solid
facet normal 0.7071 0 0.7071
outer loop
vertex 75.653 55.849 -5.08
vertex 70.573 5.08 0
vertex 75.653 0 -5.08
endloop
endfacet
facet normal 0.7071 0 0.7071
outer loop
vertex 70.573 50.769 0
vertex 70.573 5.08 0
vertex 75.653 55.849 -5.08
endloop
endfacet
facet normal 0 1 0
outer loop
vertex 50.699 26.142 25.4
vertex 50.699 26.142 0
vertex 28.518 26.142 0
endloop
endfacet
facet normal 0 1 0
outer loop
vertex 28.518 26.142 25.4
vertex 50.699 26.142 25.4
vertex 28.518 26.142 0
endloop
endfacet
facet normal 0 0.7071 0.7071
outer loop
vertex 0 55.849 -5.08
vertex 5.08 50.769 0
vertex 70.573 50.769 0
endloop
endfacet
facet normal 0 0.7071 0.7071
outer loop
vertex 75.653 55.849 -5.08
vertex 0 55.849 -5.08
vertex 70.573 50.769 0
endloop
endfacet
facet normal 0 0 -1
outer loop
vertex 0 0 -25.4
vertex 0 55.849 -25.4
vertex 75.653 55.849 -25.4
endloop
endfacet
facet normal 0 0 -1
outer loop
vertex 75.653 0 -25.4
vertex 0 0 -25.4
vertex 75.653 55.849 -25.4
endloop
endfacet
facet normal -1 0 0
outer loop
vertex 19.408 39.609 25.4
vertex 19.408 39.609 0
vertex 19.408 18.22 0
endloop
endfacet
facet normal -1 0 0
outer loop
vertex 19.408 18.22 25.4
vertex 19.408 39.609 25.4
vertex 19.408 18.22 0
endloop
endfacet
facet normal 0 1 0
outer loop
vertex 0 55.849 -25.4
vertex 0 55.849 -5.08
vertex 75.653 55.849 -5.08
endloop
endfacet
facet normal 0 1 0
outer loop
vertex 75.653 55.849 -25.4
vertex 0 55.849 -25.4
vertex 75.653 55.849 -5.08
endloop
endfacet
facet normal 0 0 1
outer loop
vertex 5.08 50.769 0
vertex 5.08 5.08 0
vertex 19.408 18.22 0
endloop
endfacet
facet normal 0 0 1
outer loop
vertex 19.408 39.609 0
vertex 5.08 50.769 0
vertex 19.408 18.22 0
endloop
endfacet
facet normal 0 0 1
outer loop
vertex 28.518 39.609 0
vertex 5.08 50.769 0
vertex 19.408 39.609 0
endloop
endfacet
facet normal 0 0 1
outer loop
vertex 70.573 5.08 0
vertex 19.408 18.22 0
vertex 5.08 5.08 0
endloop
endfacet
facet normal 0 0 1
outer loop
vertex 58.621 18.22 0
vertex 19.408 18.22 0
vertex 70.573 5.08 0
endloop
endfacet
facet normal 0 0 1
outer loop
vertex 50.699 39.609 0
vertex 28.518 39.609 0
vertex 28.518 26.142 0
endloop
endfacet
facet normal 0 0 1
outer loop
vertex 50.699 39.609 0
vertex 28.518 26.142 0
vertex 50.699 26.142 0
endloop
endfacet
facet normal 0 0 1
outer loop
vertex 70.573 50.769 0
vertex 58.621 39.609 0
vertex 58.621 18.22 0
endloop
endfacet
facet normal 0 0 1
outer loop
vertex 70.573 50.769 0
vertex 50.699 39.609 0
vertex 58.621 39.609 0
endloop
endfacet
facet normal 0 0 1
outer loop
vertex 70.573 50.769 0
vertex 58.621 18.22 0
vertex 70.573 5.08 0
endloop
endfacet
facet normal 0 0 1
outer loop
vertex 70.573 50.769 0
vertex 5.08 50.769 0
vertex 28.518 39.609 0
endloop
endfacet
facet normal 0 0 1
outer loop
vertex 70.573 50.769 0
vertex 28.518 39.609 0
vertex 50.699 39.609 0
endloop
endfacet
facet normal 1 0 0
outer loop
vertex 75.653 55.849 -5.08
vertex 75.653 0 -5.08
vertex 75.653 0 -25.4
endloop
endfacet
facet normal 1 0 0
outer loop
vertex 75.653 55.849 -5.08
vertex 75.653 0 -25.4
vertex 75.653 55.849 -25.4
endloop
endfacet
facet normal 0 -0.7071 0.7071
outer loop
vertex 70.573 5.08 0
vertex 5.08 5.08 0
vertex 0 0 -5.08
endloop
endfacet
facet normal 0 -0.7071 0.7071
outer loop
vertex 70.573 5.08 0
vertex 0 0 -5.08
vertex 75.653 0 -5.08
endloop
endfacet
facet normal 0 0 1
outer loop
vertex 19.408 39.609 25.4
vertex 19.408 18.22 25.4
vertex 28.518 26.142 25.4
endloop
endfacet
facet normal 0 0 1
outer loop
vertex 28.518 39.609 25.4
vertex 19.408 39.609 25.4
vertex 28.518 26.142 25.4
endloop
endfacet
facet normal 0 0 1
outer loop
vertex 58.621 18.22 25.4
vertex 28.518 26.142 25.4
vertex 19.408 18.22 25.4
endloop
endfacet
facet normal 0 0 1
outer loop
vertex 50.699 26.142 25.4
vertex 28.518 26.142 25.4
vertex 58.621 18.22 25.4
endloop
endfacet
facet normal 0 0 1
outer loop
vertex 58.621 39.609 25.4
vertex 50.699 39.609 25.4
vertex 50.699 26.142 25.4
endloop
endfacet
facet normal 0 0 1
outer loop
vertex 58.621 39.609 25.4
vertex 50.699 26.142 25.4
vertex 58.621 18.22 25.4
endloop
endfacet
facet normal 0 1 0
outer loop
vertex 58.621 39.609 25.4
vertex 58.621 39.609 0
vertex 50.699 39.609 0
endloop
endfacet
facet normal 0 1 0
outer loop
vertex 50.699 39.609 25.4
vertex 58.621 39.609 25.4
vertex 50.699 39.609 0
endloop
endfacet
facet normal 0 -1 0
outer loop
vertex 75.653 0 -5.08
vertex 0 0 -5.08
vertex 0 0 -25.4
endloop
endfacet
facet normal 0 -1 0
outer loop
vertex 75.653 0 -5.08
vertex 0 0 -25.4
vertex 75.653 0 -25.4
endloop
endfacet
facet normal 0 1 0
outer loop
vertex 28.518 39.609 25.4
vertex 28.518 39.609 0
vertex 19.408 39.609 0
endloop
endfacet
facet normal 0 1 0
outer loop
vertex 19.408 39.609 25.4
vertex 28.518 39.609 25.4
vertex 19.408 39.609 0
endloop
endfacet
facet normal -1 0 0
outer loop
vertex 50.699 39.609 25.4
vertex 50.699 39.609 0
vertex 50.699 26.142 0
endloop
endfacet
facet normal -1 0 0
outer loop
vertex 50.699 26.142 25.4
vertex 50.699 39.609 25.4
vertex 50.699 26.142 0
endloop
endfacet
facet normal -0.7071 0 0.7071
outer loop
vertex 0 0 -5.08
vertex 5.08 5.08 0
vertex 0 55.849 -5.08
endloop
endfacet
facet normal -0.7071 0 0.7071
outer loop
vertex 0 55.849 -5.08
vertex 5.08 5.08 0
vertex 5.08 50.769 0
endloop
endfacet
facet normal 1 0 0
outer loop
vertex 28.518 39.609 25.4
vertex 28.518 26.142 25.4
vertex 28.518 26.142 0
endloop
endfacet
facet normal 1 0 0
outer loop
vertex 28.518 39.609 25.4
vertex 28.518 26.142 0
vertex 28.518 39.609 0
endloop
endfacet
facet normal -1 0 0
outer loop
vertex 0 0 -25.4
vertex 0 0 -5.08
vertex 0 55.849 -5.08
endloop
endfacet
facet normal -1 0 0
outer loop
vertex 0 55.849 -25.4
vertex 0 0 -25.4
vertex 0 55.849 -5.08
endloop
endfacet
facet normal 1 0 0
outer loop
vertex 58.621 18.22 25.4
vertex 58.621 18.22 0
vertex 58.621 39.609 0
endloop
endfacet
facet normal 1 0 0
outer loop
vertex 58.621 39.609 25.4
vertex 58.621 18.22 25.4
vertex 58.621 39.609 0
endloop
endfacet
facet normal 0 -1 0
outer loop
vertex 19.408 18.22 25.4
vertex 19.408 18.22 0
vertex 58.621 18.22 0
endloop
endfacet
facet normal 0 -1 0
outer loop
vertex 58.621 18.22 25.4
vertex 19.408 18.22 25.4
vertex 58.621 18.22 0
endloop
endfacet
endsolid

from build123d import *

# Parameters (mm, degrees)
F0_W     = 75.653017
F0_H     = 55.848565
F1_DEPTH = 25.4
F2_SIZE  = 5.08
F4_DEPTH = 25.4


with BuildPart() as f1:
    # F0 (on Top) → F1 (new body)
    with BuildSketch(Plane.XY):
        with Locations((37.826508, 27.924283)):
            Rectangle(F0_W, F0_H)
    extrude(amount=-F1_DEPTH)

    # F2
    f2_edges = [f1.edges().sort_by_distance(p)[0] for p in [
        (0, 27.924282, 0),
        (37.826508, 0, 0),
        (75.653017, 27.924282, 0),
        (37.826508, 55.848565, 0),
    ]]
    chamfer(f2_edges, length=F2_SIZE)

    # F3 (on Top) → F4 (join)
    with BuildSketch(Plane.XY):
        Polygon((58.621187, 18.220101), (58.621187, 39.608911), (50.699413, 39.608911), (50.699413, 26.14188), (28.518412, 26.14188), (28.518412, 39.608911), (19.408364, 39.608911), (19.408364, 18.220101), align=None)
    extrude(amount=F4_DEPTH)


solid = f1.part
